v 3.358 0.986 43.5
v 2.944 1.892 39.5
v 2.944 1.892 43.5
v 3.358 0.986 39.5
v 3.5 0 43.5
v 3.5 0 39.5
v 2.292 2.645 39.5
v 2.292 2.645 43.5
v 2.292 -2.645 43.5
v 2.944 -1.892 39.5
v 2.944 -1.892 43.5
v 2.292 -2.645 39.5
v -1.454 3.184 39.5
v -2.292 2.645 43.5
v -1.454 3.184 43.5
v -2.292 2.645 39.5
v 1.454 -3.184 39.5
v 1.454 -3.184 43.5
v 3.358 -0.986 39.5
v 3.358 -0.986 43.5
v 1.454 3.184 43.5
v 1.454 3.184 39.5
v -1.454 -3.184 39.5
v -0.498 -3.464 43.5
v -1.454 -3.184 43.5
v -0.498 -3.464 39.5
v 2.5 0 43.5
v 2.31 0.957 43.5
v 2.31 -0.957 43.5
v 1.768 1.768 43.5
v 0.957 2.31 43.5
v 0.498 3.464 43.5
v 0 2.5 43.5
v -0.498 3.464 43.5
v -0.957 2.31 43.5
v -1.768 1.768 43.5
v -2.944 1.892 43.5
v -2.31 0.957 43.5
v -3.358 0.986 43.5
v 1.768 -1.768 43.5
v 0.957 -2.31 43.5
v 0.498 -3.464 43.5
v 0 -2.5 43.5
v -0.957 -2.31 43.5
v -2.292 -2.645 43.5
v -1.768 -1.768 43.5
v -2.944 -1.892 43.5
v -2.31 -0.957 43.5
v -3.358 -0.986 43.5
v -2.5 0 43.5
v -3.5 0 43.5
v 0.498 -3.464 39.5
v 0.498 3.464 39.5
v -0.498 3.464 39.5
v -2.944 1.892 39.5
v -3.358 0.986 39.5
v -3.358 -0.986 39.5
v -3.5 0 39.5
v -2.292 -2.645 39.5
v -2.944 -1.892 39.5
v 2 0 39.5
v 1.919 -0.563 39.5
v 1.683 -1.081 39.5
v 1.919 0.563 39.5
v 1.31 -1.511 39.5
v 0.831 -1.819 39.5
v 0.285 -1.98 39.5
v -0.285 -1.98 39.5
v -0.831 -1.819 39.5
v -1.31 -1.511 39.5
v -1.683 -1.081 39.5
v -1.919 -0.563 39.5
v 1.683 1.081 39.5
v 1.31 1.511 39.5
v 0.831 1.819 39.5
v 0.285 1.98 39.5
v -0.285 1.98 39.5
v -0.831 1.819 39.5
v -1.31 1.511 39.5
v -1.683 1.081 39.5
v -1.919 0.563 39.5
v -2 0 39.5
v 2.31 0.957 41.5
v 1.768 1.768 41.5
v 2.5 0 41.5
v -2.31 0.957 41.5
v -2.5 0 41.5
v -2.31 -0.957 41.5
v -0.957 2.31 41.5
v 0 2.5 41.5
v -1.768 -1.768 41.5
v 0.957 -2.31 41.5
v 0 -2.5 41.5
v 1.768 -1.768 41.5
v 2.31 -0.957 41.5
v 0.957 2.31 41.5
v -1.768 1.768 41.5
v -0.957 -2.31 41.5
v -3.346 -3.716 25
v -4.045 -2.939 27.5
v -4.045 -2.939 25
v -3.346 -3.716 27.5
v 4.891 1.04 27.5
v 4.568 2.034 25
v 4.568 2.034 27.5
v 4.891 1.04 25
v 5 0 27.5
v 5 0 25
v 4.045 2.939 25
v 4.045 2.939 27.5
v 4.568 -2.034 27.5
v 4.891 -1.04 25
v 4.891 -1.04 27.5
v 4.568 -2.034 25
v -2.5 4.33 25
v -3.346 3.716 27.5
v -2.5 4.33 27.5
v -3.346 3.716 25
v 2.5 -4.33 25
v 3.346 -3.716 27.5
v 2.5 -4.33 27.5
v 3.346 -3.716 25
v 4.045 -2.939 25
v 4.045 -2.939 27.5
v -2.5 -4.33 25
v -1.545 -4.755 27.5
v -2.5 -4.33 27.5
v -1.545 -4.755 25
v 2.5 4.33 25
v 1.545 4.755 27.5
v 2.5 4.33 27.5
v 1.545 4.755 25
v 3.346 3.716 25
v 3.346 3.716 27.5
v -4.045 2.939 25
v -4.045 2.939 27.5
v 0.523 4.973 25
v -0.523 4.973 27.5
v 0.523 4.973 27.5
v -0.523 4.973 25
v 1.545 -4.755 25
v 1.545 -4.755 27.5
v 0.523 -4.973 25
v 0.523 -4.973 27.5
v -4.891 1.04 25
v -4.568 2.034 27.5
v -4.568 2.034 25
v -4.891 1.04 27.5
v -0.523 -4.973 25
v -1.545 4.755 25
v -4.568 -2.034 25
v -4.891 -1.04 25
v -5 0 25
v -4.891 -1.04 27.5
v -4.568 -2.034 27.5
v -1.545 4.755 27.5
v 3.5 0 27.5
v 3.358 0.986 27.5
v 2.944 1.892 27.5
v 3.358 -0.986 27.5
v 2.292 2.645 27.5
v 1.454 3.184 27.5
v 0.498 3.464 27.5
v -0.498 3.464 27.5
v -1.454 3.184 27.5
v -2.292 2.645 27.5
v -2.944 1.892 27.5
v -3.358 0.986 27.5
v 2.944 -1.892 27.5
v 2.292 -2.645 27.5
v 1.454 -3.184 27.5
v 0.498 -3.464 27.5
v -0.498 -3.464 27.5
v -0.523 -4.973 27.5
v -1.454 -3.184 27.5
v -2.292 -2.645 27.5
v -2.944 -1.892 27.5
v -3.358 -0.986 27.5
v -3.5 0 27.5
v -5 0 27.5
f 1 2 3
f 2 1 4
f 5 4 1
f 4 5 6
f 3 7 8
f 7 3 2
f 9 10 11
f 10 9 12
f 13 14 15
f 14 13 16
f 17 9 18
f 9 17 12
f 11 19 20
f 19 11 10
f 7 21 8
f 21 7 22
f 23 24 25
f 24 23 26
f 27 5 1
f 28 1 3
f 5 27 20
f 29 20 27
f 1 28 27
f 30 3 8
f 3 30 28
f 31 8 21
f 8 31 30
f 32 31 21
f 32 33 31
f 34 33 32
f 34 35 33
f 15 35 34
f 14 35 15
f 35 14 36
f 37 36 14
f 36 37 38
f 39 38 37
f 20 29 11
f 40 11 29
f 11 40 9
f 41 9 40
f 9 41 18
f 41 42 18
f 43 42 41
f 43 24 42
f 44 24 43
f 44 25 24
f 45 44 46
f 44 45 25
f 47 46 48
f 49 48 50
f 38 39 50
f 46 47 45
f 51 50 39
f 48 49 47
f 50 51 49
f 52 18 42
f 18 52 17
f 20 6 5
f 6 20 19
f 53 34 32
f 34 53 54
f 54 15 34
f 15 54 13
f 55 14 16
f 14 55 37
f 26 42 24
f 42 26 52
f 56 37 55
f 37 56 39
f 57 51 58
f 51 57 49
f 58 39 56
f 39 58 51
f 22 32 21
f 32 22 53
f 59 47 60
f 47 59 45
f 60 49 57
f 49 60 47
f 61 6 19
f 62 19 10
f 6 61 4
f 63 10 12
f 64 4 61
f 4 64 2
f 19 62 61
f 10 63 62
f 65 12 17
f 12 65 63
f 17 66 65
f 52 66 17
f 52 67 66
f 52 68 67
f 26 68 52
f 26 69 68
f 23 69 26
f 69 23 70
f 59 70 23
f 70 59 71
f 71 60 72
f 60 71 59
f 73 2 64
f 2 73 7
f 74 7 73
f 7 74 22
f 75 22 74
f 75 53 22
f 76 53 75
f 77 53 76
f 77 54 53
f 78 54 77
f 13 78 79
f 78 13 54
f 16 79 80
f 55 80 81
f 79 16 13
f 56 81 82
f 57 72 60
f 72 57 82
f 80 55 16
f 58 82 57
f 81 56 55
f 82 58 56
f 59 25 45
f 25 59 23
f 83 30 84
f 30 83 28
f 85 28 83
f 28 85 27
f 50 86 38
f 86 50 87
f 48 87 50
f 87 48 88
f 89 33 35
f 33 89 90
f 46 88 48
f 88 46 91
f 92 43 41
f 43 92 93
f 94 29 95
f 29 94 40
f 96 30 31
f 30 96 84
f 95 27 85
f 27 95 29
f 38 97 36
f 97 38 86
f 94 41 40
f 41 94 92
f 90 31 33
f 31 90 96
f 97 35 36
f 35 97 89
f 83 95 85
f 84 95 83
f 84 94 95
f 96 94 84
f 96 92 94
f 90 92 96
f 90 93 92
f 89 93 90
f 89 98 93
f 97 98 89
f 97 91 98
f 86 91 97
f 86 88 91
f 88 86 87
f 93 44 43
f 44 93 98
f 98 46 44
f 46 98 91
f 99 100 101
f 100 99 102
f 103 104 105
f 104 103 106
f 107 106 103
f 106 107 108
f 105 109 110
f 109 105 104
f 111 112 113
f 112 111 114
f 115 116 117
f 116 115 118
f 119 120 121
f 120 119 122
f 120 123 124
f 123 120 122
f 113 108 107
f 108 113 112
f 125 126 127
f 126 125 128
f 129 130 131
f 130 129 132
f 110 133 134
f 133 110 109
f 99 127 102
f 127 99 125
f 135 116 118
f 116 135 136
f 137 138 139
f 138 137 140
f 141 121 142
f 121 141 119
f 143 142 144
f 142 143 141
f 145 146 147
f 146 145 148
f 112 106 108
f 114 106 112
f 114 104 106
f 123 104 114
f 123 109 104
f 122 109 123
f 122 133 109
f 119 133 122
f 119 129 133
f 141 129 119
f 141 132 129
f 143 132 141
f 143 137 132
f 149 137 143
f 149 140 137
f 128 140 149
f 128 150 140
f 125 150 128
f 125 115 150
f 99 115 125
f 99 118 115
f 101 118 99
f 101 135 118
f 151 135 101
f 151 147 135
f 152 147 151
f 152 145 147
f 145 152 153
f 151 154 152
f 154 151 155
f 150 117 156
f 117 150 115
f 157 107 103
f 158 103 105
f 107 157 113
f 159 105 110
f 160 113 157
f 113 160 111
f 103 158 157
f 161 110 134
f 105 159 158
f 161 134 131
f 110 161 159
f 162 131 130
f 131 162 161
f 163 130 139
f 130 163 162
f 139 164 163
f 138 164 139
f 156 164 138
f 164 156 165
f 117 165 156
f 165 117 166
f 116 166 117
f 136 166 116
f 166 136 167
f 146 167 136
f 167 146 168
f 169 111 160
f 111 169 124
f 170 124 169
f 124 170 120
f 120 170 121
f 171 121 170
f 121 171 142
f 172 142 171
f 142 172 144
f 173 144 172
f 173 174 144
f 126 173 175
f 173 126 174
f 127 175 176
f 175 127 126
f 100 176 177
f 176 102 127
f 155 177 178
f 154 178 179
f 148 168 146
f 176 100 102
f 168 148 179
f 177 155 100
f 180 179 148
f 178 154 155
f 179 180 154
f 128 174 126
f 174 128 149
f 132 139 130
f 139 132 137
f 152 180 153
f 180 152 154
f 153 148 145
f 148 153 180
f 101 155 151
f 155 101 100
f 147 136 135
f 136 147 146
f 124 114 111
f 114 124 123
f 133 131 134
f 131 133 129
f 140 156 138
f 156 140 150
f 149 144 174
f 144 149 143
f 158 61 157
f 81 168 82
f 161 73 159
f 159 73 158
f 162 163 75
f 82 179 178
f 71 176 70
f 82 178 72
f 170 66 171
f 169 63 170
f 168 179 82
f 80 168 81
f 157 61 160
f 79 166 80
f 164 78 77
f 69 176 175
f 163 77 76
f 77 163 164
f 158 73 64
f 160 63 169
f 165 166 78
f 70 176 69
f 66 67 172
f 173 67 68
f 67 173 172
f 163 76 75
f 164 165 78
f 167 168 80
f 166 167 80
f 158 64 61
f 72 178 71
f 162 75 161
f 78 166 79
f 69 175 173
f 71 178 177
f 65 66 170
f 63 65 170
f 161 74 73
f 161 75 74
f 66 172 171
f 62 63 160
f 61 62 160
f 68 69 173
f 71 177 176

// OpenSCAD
// тура
module tower() {
  scale([.5, .5, .5])
  translate ([0,0,50])
	union(){
    translate ([0,0,0])cylinder(5,10,10);
    translate ([0,0,5])cylinder (24,7,4);
    difference (){
      translate ([0,0,29])cylinder(8,7,7);
      translate ([0,0,33])cylinder(9,5,5);
    }
  }
}

tower();
